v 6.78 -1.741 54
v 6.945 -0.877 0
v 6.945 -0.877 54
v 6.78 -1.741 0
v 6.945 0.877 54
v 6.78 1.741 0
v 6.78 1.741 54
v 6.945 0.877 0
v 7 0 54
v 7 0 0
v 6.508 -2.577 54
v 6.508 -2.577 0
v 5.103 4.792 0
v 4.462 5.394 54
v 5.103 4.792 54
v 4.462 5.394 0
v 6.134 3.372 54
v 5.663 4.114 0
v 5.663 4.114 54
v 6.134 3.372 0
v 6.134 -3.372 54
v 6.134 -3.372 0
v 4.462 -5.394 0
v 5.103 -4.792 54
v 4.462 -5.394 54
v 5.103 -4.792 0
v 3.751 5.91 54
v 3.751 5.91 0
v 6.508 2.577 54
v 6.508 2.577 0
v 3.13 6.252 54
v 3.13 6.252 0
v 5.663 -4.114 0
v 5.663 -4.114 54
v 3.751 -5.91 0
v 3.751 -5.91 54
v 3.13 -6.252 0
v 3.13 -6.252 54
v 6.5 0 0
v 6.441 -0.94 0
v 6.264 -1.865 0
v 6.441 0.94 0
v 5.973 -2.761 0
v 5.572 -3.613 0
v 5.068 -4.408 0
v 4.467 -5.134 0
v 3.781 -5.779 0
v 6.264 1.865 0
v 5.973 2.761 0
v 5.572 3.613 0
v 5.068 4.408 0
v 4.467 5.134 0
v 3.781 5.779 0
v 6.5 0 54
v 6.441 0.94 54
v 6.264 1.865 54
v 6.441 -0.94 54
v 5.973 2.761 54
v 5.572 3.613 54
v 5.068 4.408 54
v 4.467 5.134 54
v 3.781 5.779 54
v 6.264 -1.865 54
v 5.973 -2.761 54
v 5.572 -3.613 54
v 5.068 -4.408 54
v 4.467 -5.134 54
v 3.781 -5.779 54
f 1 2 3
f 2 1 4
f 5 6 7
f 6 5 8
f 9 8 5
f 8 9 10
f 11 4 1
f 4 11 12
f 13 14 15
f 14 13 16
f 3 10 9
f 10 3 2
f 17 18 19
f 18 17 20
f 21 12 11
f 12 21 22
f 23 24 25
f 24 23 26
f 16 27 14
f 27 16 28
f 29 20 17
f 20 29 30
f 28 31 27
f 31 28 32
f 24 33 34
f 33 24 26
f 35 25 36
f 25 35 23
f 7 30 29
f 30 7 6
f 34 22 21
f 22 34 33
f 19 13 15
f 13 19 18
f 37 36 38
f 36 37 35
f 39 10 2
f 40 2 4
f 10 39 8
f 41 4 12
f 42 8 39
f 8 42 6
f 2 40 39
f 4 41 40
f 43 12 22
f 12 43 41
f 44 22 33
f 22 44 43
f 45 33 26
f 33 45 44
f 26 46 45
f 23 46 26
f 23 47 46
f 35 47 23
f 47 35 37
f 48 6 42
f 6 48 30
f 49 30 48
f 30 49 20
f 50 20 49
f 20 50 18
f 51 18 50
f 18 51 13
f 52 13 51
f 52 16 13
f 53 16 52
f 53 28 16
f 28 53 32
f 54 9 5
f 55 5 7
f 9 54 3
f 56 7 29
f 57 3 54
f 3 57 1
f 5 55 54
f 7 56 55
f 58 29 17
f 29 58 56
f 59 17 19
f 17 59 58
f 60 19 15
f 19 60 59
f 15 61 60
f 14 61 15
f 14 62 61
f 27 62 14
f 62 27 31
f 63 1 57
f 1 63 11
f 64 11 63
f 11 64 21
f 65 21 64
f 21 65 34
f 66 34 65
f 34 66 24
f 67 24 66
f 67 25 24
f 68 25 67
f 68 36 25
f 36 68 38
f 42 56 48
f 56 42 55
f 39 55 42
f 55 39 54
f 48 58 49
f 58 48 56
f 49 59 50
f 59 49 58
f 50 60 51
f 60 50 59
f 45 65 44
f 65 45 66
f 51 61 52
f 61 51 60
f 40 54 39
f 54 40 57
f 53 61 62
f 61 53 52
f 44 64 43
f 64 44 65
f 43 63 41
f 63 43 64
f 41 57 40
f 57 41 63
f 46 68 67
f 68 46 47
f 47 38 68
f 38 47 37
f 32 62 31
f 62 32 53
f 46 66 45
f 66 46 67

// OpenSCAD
$fn = 50;


difference() {
	union() {
		cylinder(h = 54, r = 7.0000000000);
		translate(v = [-4.0000000000, 0, 0]) {
			cylinder(h = 54, r = 7.0000000000);
		}
	}
	union() {
		cylinder(h = 54, r = 3.2500000000);
		cylinder(h = 54, r = 1.8000000000);
		cylinder(h = 54, r = 1.8000000000);
		cylinder(h = 54, r = 1.8000000000);
		translate(v = [-8.5000000000, 0, 0]) {
			hull() {
				translate(v = [-3.7500000000, 0.0000000000, 0]) {
					cylinder(h = 54, r = 7.5000000000);
				}
				translate(v = [3.7500000000, 0.0000000000, 0]) {
					cylinder(h = 54, r = 7.5000000000);
				}
				translate(v = [-3.7500000000, -0.0000000000, 0]) {
					cylinder(h = 54, r = 7.5000000000);
				}
				translate(v = [3.7500000000, -0.0000000000, 0]) {
					cylinder(h = 54, r = 7.5000000000);
				}
			}
		}
		translate(v = [-1.0000000000, 0, 0.0000000000]) {
			cylinder(h = 54, r = 7.5000000000);
		}
	}
}
